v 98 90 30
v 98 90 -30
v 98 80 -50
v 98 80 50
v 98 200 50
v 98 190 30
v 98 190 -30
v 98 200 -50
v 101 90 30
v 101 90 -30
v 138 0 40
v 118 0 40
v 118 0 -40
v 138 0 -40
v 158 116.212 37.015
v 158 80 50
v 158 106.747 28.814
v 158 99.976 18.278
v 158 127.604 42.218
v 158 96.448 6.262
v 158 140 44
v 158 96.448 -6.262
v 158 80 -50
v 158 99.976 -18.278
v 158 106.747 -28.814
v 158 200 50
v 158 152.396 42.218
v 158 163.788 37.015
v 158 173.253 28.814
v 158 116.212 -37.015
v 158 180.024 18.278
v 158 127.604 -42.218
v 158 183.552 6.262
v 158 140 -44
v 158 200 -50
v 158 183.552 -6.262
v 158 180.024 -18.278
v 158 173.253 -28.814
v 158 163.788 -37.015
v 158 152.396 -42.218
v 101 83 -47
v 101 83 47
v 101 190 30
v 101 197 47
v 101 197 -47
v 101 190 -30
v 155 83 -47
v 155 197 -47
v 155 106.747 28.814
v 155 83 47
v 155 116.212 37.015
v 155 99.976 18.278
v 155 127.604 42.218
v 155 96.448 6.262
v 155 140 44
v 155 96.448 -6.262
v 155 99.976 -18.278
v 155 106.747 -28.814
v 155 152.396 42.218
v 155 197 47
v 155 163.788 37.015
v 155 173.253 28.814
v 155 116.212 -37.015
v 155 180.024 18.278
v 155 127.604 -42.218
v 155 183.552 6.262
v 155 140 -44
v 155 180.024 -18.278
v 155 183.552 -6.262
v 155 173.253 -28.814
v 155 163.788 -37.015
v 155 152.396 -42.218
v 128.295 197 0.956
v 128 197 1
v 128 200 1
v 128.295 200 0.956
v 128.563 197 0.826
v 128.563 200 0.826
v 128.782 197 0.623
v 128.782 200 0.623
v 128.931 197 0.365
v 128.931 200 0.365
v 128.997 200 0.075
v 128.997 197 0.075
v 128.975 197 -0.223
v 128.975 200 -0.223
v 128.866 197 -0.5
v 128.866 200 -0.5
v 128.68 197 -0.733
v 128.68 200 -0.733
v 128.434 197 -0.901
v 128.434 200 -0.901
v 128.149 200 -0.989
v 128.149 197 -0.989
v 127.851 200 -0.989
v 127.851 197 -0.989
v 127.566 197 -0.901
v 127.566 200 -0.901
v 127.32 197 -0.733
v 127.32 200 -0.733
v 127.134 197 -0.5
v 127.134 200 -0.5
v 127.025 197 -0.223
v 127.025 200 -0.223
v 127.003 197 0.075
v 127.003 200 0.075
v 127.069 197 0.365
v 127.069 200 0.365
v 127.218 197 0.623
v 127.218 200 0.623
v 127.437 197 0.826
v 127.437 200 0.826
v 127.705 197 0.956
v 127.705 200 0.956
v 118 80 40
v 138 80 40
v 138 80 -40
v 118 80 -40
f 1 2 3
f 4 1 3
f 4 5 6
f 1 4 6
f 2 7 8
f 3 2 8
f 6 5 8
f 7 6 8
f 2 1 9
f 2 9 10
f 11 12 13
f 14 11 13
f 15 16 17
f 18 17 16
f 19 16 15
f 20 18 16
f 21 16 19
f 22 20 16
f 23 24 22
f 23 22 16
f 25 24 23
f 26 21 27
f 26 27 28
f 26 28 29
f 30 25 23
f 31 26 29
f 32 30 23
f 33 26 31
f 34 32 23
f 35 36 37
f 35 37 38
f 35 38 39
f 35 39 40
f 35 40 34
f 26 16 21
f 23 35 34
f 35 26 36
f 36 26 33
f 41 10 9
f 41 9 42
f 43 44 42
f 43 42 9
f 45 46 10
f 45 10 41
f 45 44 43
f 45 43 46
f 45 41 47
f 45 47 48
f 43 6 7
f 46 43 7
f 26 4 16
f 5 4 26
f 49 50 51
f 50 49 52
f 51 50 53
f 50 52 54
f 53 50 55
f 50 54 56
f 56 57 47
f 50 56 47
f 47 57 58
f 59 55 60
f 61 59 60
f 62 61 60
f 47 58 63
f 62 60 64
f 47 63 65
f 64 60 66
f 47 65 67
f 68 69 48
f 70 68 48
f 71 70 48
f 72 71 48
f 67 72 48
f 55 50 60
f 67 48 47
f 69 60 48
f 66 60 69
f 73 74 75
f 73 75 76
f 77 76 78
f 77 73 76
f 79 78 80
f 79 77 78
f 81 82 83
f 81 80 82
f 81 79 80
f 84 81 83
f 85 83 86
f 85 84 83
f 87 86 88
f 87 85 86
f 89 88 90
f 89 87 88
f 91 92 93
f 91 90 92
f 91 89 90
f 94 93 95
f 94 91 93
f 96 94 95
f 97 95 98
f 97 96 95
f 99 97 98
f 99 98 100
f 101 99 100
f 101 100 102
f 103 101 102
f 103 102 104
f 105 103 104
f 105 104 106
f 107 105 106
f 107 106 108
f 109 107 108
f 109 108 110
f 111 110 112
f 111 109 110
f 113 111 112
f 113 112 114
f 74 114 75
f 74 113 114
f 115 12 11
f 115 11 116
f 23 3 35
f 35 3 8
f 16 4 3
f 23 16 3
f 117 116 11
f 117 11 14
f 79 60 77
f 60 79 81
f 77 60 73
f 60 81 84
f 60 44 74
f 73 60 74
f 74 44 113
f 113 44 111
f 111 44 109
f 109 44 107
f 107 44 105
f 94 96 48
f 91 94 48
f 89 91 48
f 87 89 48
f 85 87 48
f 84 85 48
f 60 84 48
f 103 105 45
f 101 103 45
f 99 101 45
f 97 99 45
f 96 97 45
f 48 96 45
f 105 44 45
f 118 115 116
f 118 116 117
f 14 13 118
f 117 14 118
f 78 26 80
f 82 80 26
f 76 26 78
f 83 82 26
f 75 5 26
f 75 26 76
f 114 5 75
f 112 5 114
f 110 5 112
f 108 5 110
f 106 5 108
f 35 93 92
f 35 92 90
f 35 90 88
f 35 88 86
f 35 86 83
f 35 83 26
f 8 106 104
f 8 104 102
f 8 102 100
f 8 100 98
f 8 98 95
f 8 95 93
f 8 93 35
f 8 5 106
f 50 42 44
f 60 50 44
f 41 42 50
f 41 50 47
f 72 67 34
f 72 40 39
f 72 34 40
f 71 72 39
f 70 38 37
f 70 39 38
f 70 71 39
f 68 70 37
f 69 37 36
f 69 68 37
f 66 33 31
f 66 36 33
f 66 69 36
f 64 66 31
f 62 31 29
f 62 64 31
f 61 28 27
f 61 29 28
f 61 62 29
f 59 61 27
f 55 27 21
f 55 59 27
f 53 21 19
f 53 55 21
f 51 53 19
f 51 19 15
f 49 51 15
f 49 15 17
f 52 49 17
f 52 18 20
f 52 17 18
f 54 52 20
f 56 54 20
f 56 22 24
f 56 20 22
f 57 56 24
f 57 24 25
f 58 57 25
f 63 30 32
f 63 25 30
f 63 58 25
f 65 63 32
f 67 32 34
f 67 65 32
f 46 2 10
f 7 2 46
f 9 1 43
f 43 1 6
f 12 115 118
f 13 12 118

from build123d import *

# Parameters (mm, degrees)
OUTER_START        = 98
SKETCH1_W          = 100
SKETCH1_H          = 120
OUTER_DEPTH        = 60
INNER_START        = 101
SKETCH2_W          = 94
SKETCH2_H          = 114
INNER_DEPTH        = 54
THROAT_PORT_START  = 97
SKETCH3_W          = 60
SKETCH3_H          = 100
THROAT_PORT_DEPTH  = 5
FAN_PORT_START     = 154
SKETCH4_R          = 44
FAN_PORT_DEPTH     = 5
TC_PORT_START      = 196
SKETCH5_R          = 1
TC_PORT_DEPTH      = 5
PLENUM_STAND_START = 118
SKETCH6_W          = 80
SKETCH6_H          = 80
PLENUM_STAND_DEPTH = 20


with BuildPart() as part:
    # Sketch1 → outer (new body)
    with BuildSketch(Plane(origin=(0, 0, 0), x_dir=(0, 0, -1), z_dir=(1, 0, 0)).offset(OUTER_START)):
        with Locations((0, 140)):
            Rectangle(SKETCH1_W, SKETCH1_H)
    extrude(amount=OUTER_DEPTH)


with BuildPart() as body_2:
    # Sketch2 → inner (new body)
    with BuildSketch(Plane(origin=(0, 0, 0), x_dir=(0, 0, -1), z_dir=(1, 0, 0)).offset(INNER_START)):
        with Locations((0, 140)):
            Rectangle(SKETCH2_W, SKETCH2_H)
    extrude(amount=INNER_DEPTH)


with BuildPart() as body_3:
    # Sketch3 → throat_port (new body)
    with BuildSketch(Plane(origin=(0, 0, 0), x_dir=(0, 0, -1), z_dir=(1, 0, 0)).offset(THROAT_PORT_START)):
        with Locations((0, 140)):
            Rectangle(SKETCH3_W, SKETCH3_H)
    extrude(amount=THROAT_PORT_DEPTH)


with BuildPart() as body_4:
    # Sketch4 → fan_port (new body)
    with BuildSketch(Plane(origin=(0, 0, 0), x_dir=(0, 0, -1), z_dir=(1, 0, 0)).offset(FAN_PORT_START)):
        with Locations((0, 140)):
            Circle(SKETCH4_R)
    extrude(amount=FAN_PORT_DEPTH)


with BuildPart() as body_5:
    # Sketch5 → tc_port (new body)
    with BuildSketch(Plane(origin=(0, 0, 0), x_dir=(1, 0, 0), z_dir=(0, 1, 0)).offset(TC_PORT_START)):
        with Locations((128, 0)):
            Circle(SKETCH5_R)
    extrude(amount=TC_PORT_DEPTH)


with BuildPart() as part_1:
    add(part.part)

    # Combine1: cut body 2
    add(body_2.part, mode=Mode.SUBTRACT)

    # Combine2: cut body 3
    add(body_3.part, mode=Mode.SUBTRACT)

    # Combine3: cut body 4
    add(body_4.part, mode=Mode.SUBTRACT)

    # Combine4: cut body 5
    add(body_5.part, mode=Mode.SUBTRACT)


with BuildPart() as body_2_2:
    # Sketch6 → plenum_stand (new body)
    with BuildSketch(Plane(origin=(0, 0, 0), x_dir=(0, 0, -1), z_dir=(1, 0, 0)).offset(PLENUM_STAND_START)):
        with Locations((0, 40)):
            Rectangle(SKETCH6_W, SKETCH6_H)
    extrude(amount=PLENUM_STAND_DEPTH)


solid = Compound([part_1.part, body_2_2.part])
